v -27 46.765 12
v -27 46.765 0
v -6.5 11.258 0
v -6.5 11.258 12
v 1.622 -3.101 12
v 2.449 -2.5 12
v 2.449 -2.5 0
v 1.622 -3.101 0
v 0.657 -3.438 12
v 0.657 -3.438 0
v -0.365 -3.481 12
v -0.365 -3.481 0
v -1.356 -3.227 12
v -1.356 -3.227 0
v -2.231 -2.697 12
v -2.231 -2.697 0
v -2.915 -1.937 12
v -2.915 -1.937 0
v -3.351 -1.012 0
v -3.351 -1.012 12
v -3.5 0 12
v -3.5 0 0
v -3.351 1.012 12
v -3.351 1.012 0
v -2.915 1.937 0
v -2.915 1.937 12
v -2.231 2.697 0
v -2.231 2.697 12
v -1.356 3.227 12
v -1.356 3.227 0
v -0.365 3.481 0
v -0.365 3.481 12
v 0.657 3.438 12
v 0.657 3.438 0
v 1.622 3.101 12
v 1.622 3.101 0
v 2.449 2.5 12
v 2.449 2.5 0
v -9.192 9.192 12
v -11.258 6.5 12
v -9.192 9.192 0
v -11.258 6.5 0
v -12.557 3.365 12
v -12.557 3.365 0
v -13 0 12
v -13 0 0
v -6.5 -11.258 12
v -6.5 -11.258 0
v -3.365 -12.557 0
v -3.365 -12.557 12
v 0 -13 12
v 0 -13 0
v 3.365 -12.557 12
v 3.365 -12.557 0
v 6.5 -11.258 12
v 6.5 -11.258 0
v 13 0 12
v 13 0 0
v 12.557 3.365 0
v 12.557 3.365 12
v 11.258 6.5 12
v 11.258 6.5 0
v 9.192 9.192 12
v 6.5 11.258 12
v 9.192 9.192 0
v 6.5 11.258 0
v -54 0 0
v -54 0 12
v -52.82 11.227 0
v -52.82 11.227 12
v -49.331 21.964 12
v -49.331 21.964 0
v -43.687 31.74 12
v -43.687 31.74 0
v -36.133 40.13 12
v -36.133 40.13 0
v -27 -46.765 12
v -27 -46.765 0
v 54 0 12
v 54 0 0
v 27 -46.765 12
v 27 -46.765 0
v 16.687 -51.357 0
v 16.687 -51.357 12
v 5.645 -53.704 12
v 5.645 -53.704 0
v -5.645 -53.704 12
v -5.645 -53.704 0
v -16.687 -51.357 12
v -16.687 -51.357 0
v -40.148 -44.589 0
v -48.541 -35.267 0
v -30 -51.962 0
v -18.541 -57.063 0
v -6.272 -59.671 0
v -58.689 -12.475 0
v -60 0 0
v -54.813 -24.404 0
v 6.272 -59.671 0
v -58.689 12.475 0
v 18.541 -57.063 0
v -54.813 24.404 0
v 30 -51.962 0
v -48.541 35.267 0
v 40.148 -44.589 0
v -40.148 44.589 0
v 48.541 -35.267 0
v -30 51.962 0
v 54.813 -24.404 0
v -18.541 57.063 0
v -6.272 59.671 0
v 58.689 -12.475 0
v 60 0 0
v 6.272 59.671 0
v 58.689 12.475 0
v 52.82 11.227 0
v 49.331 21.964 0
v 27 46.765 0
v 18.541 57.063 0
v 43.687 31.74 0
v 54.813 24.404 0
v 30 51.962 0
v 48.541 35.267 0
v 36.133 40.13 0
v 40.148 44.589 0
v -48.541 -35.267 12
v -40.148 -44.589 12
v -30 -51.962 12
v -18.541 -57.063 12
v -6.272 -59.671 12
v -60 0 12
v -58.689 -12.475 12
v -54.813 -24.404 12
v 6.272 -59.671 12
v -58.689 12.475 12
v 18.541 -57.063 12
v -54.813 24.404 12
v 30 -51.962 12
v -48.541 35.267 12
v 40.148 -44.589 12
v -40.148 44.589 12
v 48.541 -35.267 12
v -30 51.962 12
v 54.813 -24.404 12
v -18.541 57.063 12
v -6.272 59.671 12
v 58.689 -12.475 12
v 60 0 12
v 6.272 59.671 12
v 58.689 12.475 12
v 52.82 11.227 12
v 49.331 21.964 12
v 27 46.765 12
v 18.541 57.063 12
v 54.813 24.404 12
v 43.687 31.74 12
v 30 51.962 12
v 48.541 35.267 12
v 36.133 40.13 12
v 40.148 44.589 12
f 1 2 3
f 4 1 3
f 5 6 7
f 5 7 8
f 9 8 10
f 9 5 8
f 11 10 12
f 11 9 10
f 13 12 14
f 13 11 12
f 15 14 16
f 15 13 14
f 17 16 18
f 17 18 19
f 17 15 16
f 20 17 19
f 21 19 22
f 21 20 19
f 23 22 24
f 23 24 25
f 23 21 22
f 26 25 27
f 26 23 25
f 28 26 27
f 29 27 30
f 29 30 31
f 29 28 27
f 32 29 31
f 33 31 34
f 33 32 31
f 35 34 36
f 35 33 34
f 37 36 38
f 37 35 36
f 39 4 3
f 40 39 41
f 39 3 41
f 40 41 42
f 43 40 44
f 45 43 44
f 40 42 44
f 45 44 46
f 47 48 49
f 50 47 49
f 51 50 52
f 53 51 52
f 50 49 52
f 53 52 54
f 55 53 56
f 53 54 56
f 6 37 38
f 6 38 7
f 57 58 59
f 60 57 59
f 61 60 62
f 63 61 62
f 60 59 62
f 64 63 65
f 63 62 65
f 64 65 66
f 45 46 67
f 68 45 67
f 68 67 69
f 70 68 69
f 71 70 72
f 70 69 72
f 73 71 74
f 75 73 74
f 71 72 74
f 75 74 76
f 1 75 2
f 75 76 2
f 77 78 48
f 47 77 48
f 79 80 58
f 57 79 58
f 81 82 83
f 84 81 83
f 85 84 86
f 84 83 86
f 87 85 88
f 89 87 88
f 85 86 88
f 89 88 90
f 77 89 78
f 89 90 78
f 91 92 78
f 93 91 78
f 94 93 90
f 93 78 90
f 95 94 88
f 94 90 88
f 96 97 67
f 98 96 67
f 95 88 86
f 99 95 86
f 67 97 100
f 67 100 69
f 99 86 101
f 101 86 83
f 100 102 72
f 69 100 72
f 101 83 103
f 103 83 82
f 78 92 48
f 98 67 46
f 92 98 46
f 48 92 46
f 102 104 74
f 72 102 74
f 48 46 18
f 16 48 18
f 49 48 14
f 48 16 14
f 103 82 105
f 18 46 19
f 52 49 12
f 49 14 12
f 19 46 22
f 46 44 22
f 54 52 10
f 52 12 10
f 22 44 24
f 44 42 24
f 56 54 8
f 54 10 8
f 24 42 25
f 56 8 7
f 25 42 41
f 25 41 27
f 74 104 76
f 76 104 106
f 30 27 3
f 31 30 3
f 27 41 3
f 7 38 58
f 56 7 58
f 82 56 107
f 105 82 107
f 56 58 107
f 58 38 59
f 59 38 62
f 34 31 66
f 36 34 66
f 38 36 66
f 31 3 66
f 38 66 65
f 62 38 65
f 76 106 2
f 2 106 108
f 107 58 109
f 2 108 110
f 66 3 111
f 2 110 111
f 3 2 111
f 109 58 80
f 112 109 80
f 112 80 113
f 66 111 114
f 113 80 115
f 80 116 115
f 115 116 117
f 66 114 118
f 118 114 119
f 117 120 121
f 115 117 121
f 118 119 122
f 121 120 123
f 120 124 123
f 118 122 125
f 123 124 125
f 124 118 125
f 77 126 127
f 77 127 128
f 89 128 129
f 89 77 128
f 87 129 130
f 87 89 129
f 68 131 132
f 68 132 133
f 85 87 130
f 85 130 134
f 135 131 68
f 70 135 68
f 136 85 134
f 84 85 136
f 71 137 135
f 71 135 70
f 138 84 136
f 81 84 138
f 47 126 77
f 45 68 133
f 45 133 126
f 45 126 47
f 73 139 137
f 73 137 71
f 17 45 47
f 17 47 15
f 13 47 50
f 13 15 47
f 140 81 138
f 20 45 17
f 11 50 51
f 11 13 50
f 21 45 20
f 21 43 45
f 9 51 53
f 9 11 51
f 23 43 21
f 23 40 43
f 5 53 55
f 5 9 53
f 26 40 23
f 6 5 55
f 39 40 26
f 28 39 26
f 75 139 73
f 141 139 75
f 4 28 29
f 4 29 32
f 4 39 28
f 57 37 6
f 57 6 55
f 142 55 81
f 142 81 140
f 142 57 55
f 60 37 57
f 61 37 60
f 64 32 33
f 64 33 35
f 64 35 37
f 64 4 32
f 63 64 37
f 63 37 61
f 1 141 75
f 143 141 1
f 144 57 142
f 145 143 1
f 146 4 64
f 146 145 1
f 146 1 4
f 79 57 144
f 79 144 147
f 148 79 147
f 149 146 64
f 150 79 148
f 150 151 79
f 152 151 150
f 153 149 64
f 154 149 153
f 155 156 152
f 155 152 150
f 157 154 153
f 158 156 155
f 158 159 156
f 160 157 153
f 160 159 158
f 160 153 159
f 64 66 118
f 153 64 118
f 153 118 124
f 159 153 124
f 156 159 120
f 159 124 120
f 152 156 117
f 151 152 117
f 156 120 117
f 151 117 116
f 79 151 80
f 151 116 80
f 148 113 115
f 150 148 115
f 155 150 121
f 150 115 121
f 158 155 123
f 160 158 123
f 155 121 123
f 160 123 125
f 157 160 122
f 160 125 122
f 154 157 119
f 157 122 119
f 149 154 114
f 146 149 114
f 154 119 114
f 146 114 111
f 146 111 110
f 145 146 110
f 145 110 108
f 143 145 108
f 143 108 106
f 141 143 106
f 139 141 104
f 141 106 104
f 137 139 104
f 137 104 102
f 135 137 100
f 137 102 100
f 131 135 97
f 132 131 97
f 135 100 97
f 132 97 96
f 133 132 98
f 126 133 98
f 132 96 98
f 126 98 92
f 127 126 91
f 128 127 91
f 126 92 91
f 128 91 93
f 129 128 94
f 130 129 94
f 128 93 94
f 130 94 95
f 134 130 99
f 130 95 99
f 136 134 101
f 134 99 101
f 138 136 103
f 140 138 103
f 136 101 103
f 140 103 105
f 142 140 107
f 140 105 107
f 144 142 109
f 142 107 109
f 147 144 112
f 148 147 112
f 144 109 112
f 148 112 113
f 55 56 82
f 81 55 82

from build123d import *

# Parameters (mm, degrees)
ESQUISSE1_R        = 60
BOSS_EXTRU_1_DEPTH = 12
CUT_EXTRUDE1_DEPTH = 12


with BuildPart() as part:
    # Esquisse1 → Boss.-Extru.1 (new body)
    with BuildSketch(Plane.XY):
        Circle(ESQUISSE1_R)
        with BuildLine():
            ThreePointArc((13, 0), (11.258330249, 6.5), (6.5, 11.258330249))
            Line((6.5, 11.258330249), (27, 46.765371804))
            ThreePointArc((27, 46.765371804), (46.765371804, 27), (54, 0))
            Line((54, 0), (13, 0))
        make_face(mode=Mode.SUBTRACT)
        with BuildLine():
            Line((-27, 46.765371804), (-6.5, 11.258330249))
            ThreePointArc((-6.5, 11.258330249), (-11.258330249, 6.5), (-13, 0))
            Line((-13, 0), (-54, 0))
            ThreePointArc((-54, 0), (-46.765371804, 27), (-27, 46.765371804))
        make_face(mode=Mode.SUBTRACT)
        with BuildLine():
            Line((-27, -46.765371804), (-6.5, -11.258330249))
            ThreePointArc((-6.5, -11.258330249), (0, -13), (6.5, -11.258330249))
            Line((6.5, -11.258330249), (27, -46.765371804))
            ThreePointArc((27, -46.765371804), (0, -54), (-27, -46.765371804))
        make_face(mode=Mode.SUBTRACT)
    extrude(amount=BOSS_EXTRU_1_DEPTH)

    # Sketch1 → Cut-Extrude1 (cut)
    with BuildSketch(Plane.XY.offset(12)):
        with BuildLine():
            Line((2.449489743, 2.5), (2.449489743, -2.5))
            ThreePointArc((2.449489743, -2.5), (-3.5, 0), (2.449489743, 2.5))
        make_face()
    extrude(amount=-CUT_EXTRUDE1_DEPTH, mode=Mode.SUBTRACT)


solid = part.part
